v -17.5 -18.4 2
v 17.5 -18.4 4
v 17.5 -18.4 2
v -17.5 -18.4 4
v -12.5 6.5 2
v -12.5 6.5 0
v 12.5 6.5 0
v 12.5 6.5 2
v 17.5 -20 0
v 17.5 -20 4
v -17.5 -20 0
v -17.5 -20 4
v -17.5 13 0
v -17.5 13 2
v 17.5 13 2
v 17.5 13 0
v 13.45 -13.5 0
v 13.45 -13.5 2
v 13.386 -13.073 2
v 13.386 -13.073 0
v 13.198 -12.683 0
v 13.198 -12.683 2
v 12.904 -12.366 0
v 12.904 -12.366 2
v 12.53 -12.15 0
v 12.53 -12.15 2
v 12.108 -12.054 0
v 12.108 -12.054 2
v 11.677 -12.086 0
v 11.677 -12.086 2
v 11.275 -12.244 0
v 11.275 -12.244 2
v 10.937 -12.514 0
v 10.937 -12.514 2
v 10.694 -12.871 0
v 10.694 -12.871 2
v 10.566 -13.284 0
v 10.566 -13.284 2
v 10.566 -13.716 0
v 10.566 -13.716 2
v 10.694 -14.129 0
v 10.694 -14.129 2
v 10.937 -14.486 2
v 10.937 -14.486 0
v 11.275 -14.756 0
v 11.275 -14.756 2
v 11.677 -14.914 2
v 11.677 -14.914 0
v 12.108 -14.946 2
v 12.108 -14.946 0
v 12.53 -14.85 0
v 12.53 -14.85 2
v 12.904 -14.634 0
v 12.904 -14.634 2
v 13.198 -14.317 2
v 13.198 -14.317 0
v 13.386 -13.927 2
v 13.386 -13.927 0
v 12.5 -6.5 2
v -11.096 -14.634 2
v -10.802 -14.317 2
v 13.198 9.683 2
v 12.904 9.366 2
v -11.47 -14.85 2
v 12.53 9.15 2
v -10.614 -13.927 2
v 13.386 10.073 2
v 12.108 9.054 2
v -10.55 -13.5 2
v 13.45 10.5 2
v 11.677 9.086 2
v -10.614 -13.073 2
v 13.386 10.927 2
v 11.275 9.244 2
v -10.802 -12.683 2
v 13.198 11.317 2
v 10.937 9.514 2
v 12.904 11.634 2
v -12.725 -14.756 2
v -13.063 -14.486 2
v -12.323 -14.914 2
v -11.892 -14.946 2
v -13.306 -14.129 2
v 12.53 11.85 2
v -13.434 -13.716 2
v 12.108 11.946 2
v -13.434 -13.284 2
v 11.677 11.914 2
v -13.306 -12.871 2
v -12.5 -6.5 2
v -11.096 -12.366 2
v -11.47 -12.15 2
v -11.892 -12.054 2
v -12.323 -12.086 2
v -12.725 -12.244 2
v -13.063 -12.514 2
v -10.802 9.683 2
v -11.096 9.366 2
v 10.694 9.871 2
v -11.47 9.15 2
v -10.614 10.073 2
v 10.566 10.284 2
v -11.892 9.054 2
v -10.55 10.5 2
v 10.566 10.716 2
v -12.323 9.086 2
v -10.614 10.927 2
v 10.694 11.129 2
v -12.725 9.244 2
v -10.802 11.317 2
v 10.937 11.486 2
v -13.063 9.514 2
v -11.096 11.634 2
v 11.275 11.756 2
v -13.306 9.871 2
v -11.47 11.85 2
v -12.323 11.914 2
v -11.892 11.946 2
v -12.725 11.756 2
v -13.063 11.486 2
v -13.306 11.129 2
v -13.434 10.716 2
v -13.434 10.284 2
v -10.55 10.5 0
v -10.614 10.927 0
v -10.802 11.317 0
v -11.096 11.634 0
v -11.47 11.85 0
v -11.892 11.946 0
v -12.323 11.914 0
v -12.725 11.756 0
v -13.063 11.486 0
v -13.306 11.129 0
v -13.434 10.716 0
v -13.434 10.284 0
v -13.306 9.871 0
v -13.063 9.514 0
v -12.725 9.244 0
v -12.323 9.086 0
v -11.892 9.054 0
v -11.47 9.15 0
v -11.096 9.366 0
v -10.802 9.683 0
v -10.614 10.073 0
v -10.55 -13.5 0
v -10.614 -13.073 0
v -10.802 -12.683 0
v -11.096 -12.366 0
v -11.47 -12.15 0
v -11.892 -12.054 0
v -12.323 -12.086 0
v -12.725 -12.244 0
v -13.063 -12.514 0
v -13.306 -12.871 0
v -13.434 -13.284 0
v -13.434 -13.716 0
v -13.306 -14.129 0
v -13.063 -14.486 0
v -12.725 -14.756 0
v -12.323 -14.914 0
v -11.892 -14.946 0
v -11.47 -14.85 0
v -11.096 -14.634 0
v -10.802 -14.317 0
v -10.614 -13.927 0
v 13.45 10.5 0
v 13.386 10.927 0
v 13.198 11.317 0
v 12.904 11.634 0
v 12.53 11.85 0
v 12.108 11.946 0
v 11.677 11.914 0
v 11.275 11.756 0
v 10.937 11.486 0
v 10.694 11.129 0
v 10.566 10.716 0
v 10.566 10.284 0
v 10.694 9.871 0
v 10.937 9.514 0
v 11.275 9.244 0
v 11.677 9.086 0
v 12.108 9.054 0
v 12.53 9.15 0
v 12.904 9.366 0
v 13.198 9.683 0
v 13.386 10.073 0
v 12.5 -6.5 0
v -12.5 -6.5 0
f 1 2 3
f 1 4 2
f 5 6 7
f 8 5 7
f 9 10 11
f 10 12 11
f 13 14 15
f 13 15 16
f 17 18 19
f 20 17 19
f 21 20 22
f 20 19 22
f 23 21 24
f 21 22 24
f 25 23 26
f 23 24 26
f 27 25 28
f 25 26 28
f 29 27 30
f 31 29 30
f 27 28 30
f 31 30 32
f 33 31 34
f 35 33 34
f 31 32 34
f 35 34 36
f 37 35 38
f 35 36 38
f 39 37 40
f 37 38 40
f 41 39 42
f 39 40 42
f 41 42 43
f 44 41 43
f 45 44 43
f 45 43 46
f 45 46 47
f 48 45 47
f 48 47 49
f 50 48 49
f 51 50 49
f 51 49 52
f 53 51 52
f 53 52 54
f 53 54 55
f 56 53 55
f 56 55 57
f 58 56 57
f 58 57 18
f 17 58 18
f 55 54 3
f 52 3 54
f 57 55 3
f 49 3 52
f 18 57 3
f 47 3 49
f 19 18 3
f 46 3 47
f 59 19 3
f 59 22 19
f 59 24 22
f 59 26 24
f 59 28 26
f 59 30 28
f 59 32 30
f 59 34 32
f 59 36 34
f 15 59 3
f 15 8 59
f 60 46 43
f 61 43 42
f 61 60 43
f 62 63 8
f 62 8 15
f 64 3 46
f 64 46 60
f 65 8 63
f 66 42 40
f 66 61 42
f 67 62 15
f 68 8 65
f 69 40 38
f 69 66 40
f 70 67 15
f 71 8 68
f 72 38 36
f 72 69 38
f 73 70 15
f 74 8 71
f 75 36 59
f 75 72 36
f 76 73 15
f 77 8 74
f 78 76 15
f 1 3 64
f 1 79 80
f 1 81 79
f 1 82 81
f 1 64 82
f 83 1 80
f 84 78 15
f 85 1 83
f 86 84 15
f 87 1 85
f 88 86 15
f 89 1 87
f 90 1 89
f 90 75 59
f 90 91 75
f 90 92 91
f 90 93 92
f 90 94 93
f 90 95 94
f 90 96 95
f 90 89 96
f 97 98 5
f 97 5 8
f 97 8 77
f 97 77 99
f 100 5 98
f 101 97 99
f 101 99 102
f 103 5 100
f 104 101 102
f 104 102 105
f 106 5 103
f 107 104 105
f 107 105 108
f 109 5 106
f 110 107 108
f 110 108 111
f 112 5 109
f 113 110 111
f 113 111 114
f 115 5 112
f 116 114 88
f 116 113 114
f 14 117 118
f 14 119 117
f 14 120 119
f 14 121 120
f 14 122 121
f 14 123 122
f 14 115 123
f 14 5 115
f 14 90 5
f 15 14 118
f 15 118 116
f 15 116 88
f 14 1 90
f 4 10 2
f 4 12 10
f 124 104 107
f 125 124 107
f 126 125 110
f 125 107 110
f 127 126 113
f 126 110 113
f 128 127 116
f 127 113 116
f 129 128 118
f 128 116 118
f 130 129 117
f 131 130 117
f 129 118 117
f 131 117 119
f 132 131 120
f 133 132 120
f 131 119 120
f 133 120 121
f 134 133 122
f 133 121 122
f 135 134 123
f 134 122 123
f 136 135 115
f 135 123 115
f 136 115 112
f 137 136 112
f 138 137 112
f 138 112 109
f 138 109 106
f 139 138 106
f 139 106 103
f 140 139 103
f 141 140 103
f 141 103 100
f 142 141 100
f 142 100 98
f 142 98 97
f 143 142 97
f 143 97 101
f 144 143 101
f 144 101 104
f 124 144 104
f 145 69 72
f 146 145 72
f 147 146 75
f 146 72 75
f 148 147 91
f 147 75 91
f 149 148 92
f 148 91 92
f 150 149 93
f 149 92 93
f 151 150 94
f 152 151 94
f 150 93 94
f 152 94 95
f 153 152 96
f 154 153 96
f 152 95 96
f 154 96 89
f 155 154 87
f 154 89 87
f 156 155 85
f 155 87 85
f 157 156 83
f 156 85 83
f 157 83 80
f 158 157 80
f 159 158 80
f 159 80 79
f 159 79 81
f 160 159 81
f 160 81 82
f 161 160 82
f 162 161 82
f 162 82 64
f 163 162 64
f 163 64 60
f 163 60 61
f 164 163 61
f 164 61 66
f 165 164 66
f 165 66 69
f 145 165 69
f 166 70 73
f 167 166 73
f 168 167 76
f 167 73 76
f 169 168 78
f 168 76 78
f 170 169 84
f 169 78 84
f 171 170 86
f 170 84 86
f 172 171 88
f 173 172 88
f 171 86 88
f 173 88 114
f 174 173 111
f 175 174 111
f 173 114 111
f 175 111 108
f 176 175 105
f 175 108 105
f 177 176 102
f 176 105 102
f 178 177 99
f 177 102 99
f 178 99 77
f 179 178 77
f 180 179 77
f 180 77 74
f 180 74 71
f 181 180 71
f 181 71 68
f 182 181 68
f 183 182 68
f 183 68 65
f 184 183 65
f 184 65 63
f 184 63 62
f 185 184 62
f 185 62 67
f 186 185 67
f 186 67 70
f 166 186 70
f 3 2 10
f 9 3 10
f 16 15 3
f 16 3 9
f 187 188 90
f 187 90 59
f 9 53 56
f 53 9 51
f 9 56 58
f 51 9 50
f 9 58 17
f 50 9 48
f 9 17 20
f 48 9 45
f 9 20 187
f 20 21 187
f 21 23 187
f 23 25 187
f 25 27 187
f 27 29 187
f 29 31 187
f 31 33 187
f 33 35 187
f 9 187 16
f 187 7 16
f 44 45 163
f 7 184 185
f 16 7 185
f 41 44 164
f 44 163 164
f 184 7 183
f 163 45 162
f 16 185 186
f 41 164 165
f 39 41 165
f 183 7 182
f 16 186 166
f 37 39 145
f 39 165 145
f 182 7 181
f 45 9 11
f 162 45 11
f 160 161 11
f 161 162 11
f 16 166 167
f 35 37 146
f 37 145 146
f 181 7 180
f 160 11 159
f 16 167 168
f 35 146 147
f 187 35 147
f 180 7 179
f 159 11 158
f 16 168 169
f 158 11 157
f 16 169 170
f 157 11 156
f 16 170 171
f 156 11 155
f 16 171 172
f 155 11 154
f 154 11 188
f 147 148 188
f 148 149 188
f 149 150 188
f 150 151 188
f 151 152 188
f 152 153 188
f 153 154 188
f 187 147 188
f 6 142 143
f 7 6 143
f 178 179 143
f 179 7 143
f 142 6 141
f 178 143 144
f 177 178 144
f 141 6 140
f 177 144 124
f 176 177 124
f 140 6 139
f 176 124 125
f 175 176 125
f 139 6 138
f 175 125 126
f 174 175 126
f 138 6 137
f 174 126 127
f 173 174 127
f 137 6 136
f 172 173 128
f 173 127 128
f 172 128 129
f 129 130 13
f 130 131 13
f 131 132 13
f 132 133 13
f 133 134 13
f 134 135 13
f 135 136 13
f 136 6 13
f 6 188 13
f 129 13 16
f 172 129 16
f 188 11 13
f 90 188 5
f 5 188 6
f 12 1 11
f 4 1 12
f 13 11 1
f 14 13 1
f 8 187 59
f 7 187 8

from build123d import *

# Parameters (mm, degrees)
SKETCH1_W           = 29
SKETCH1_H           = 28
SKETCH1_W_2         = 25
SKETCH1_H_2         = 13
BOSS_EXTRUDE1_DEPTH = 2
SKETCH2_R           = 1.45
CUT_EXTRUDE1_DEPTH  = 3
BOSS_EXTRUDE2_DEPTH = 29
SKETCH5_W           = 29
SKETCH5_H           = 2
BOSS_EXTRUDE3_DEPTH = 1
SKETCH6_W           = 2
SKETCH6_H           = 33
SKETCH6_H_2         = 1.6
BOSS_EXTRUDE4_DEPTH = 3
SKETCH7_W           = 2
SKETCH7_H           = 33
SKETCH7_H_2         = 1.6
BOSS_EXTRUDE5_DEPTH = 3


with BuildPart() as part:
    # Sketch1 → Boss-Extrude1 (new body)
    with BuildSketch(Plane.XY):
        with Locations((0, -2)):
            Rectangle(SKETCH1_W, SKETCH1_H)
        Rectangle(SKETCH1_W_2, SKETCH1_H_2, mode=Mode.SUBTRACT)
    extrude(amount=BOSS_EXTRUDE1_DEPTH)

    # Sketch2 → Cut-Extrude1 (cut, through all)
    with BuildSketch(Plane.XY.offset(2)):
        with Locations((-12, 10.5)):
            Circle(SKETCH2_R)
        with Locations((-12, -13.5)):
            Circle(SKETCH2_R)
        with Locations((12, -13.5)):
            Circle(SKETCH2_R)
        with Locations((12, 10.5)):
            Circle(SKETCH2_R)
    extrude(amount=-CUT_EXTRUDE1_DEPTH, mode=Mode.SUBTRACT)

    # Sketch3 → Boss-Extrude2 (add, through all)
    with BuildSketch(Plane(origin=(14.5, 0, 0), x_dir=(0, 0, -1), z_dir=(1, 0, 0))):
        Polygon((-4, -20), (0, -20), (0, -18.4), (0, -16), (-2, -16), (-2, -18.4), (-4, -18.4), align=None)
    extrude(amount=-BOSS_EXTRUDE2_DEPTH)

    # Sketch5 → Boss-Extrude3 (add)
    with BuildSketch(Plane(origin=(0, 12, 0), x_dir=(1, 0, 0), z_dir=(0, 1, 0))):
        with Locations((0, -1)):
            Rectangle(SKETCH5_W, SKETCH5_H)
    extrude(amount=BOSS_EXTRUDE3_DEPTH)

    # Sketch6 → Boss-Extrude4 (add)
    with BuildSketch(Plane.ZY.offset(14.5)):
        with Locations((1, -3.5)):
            Rectangle(SKETCH6_W, SKETCH6_H)
        with Locations((3, -19.2)):
            Rectangle(SKETCH6_W, SKETCH6_H_2)
    extrude(amount=BOSS_EXTRUDE4_DEPTH)

    # Sketch7 → Boss-Extrude5 (add)
    with BuildSketch(Plane(origin=(14.5, 0, 0), x_dir=(0, 0, -1), z_dir=(1, 0, 0))):
        with Locations((-1, -3.5)):
            Rectangle(SKETCH7_W, SKETCH7_H)
        with Locations((-3, -19.2)):
            Rectangle(SKETCH7_W, SKETCH7_H_2)
    extrude(amount=BOSS_EXTRUDE5_DEPTH)


solid = part.part
